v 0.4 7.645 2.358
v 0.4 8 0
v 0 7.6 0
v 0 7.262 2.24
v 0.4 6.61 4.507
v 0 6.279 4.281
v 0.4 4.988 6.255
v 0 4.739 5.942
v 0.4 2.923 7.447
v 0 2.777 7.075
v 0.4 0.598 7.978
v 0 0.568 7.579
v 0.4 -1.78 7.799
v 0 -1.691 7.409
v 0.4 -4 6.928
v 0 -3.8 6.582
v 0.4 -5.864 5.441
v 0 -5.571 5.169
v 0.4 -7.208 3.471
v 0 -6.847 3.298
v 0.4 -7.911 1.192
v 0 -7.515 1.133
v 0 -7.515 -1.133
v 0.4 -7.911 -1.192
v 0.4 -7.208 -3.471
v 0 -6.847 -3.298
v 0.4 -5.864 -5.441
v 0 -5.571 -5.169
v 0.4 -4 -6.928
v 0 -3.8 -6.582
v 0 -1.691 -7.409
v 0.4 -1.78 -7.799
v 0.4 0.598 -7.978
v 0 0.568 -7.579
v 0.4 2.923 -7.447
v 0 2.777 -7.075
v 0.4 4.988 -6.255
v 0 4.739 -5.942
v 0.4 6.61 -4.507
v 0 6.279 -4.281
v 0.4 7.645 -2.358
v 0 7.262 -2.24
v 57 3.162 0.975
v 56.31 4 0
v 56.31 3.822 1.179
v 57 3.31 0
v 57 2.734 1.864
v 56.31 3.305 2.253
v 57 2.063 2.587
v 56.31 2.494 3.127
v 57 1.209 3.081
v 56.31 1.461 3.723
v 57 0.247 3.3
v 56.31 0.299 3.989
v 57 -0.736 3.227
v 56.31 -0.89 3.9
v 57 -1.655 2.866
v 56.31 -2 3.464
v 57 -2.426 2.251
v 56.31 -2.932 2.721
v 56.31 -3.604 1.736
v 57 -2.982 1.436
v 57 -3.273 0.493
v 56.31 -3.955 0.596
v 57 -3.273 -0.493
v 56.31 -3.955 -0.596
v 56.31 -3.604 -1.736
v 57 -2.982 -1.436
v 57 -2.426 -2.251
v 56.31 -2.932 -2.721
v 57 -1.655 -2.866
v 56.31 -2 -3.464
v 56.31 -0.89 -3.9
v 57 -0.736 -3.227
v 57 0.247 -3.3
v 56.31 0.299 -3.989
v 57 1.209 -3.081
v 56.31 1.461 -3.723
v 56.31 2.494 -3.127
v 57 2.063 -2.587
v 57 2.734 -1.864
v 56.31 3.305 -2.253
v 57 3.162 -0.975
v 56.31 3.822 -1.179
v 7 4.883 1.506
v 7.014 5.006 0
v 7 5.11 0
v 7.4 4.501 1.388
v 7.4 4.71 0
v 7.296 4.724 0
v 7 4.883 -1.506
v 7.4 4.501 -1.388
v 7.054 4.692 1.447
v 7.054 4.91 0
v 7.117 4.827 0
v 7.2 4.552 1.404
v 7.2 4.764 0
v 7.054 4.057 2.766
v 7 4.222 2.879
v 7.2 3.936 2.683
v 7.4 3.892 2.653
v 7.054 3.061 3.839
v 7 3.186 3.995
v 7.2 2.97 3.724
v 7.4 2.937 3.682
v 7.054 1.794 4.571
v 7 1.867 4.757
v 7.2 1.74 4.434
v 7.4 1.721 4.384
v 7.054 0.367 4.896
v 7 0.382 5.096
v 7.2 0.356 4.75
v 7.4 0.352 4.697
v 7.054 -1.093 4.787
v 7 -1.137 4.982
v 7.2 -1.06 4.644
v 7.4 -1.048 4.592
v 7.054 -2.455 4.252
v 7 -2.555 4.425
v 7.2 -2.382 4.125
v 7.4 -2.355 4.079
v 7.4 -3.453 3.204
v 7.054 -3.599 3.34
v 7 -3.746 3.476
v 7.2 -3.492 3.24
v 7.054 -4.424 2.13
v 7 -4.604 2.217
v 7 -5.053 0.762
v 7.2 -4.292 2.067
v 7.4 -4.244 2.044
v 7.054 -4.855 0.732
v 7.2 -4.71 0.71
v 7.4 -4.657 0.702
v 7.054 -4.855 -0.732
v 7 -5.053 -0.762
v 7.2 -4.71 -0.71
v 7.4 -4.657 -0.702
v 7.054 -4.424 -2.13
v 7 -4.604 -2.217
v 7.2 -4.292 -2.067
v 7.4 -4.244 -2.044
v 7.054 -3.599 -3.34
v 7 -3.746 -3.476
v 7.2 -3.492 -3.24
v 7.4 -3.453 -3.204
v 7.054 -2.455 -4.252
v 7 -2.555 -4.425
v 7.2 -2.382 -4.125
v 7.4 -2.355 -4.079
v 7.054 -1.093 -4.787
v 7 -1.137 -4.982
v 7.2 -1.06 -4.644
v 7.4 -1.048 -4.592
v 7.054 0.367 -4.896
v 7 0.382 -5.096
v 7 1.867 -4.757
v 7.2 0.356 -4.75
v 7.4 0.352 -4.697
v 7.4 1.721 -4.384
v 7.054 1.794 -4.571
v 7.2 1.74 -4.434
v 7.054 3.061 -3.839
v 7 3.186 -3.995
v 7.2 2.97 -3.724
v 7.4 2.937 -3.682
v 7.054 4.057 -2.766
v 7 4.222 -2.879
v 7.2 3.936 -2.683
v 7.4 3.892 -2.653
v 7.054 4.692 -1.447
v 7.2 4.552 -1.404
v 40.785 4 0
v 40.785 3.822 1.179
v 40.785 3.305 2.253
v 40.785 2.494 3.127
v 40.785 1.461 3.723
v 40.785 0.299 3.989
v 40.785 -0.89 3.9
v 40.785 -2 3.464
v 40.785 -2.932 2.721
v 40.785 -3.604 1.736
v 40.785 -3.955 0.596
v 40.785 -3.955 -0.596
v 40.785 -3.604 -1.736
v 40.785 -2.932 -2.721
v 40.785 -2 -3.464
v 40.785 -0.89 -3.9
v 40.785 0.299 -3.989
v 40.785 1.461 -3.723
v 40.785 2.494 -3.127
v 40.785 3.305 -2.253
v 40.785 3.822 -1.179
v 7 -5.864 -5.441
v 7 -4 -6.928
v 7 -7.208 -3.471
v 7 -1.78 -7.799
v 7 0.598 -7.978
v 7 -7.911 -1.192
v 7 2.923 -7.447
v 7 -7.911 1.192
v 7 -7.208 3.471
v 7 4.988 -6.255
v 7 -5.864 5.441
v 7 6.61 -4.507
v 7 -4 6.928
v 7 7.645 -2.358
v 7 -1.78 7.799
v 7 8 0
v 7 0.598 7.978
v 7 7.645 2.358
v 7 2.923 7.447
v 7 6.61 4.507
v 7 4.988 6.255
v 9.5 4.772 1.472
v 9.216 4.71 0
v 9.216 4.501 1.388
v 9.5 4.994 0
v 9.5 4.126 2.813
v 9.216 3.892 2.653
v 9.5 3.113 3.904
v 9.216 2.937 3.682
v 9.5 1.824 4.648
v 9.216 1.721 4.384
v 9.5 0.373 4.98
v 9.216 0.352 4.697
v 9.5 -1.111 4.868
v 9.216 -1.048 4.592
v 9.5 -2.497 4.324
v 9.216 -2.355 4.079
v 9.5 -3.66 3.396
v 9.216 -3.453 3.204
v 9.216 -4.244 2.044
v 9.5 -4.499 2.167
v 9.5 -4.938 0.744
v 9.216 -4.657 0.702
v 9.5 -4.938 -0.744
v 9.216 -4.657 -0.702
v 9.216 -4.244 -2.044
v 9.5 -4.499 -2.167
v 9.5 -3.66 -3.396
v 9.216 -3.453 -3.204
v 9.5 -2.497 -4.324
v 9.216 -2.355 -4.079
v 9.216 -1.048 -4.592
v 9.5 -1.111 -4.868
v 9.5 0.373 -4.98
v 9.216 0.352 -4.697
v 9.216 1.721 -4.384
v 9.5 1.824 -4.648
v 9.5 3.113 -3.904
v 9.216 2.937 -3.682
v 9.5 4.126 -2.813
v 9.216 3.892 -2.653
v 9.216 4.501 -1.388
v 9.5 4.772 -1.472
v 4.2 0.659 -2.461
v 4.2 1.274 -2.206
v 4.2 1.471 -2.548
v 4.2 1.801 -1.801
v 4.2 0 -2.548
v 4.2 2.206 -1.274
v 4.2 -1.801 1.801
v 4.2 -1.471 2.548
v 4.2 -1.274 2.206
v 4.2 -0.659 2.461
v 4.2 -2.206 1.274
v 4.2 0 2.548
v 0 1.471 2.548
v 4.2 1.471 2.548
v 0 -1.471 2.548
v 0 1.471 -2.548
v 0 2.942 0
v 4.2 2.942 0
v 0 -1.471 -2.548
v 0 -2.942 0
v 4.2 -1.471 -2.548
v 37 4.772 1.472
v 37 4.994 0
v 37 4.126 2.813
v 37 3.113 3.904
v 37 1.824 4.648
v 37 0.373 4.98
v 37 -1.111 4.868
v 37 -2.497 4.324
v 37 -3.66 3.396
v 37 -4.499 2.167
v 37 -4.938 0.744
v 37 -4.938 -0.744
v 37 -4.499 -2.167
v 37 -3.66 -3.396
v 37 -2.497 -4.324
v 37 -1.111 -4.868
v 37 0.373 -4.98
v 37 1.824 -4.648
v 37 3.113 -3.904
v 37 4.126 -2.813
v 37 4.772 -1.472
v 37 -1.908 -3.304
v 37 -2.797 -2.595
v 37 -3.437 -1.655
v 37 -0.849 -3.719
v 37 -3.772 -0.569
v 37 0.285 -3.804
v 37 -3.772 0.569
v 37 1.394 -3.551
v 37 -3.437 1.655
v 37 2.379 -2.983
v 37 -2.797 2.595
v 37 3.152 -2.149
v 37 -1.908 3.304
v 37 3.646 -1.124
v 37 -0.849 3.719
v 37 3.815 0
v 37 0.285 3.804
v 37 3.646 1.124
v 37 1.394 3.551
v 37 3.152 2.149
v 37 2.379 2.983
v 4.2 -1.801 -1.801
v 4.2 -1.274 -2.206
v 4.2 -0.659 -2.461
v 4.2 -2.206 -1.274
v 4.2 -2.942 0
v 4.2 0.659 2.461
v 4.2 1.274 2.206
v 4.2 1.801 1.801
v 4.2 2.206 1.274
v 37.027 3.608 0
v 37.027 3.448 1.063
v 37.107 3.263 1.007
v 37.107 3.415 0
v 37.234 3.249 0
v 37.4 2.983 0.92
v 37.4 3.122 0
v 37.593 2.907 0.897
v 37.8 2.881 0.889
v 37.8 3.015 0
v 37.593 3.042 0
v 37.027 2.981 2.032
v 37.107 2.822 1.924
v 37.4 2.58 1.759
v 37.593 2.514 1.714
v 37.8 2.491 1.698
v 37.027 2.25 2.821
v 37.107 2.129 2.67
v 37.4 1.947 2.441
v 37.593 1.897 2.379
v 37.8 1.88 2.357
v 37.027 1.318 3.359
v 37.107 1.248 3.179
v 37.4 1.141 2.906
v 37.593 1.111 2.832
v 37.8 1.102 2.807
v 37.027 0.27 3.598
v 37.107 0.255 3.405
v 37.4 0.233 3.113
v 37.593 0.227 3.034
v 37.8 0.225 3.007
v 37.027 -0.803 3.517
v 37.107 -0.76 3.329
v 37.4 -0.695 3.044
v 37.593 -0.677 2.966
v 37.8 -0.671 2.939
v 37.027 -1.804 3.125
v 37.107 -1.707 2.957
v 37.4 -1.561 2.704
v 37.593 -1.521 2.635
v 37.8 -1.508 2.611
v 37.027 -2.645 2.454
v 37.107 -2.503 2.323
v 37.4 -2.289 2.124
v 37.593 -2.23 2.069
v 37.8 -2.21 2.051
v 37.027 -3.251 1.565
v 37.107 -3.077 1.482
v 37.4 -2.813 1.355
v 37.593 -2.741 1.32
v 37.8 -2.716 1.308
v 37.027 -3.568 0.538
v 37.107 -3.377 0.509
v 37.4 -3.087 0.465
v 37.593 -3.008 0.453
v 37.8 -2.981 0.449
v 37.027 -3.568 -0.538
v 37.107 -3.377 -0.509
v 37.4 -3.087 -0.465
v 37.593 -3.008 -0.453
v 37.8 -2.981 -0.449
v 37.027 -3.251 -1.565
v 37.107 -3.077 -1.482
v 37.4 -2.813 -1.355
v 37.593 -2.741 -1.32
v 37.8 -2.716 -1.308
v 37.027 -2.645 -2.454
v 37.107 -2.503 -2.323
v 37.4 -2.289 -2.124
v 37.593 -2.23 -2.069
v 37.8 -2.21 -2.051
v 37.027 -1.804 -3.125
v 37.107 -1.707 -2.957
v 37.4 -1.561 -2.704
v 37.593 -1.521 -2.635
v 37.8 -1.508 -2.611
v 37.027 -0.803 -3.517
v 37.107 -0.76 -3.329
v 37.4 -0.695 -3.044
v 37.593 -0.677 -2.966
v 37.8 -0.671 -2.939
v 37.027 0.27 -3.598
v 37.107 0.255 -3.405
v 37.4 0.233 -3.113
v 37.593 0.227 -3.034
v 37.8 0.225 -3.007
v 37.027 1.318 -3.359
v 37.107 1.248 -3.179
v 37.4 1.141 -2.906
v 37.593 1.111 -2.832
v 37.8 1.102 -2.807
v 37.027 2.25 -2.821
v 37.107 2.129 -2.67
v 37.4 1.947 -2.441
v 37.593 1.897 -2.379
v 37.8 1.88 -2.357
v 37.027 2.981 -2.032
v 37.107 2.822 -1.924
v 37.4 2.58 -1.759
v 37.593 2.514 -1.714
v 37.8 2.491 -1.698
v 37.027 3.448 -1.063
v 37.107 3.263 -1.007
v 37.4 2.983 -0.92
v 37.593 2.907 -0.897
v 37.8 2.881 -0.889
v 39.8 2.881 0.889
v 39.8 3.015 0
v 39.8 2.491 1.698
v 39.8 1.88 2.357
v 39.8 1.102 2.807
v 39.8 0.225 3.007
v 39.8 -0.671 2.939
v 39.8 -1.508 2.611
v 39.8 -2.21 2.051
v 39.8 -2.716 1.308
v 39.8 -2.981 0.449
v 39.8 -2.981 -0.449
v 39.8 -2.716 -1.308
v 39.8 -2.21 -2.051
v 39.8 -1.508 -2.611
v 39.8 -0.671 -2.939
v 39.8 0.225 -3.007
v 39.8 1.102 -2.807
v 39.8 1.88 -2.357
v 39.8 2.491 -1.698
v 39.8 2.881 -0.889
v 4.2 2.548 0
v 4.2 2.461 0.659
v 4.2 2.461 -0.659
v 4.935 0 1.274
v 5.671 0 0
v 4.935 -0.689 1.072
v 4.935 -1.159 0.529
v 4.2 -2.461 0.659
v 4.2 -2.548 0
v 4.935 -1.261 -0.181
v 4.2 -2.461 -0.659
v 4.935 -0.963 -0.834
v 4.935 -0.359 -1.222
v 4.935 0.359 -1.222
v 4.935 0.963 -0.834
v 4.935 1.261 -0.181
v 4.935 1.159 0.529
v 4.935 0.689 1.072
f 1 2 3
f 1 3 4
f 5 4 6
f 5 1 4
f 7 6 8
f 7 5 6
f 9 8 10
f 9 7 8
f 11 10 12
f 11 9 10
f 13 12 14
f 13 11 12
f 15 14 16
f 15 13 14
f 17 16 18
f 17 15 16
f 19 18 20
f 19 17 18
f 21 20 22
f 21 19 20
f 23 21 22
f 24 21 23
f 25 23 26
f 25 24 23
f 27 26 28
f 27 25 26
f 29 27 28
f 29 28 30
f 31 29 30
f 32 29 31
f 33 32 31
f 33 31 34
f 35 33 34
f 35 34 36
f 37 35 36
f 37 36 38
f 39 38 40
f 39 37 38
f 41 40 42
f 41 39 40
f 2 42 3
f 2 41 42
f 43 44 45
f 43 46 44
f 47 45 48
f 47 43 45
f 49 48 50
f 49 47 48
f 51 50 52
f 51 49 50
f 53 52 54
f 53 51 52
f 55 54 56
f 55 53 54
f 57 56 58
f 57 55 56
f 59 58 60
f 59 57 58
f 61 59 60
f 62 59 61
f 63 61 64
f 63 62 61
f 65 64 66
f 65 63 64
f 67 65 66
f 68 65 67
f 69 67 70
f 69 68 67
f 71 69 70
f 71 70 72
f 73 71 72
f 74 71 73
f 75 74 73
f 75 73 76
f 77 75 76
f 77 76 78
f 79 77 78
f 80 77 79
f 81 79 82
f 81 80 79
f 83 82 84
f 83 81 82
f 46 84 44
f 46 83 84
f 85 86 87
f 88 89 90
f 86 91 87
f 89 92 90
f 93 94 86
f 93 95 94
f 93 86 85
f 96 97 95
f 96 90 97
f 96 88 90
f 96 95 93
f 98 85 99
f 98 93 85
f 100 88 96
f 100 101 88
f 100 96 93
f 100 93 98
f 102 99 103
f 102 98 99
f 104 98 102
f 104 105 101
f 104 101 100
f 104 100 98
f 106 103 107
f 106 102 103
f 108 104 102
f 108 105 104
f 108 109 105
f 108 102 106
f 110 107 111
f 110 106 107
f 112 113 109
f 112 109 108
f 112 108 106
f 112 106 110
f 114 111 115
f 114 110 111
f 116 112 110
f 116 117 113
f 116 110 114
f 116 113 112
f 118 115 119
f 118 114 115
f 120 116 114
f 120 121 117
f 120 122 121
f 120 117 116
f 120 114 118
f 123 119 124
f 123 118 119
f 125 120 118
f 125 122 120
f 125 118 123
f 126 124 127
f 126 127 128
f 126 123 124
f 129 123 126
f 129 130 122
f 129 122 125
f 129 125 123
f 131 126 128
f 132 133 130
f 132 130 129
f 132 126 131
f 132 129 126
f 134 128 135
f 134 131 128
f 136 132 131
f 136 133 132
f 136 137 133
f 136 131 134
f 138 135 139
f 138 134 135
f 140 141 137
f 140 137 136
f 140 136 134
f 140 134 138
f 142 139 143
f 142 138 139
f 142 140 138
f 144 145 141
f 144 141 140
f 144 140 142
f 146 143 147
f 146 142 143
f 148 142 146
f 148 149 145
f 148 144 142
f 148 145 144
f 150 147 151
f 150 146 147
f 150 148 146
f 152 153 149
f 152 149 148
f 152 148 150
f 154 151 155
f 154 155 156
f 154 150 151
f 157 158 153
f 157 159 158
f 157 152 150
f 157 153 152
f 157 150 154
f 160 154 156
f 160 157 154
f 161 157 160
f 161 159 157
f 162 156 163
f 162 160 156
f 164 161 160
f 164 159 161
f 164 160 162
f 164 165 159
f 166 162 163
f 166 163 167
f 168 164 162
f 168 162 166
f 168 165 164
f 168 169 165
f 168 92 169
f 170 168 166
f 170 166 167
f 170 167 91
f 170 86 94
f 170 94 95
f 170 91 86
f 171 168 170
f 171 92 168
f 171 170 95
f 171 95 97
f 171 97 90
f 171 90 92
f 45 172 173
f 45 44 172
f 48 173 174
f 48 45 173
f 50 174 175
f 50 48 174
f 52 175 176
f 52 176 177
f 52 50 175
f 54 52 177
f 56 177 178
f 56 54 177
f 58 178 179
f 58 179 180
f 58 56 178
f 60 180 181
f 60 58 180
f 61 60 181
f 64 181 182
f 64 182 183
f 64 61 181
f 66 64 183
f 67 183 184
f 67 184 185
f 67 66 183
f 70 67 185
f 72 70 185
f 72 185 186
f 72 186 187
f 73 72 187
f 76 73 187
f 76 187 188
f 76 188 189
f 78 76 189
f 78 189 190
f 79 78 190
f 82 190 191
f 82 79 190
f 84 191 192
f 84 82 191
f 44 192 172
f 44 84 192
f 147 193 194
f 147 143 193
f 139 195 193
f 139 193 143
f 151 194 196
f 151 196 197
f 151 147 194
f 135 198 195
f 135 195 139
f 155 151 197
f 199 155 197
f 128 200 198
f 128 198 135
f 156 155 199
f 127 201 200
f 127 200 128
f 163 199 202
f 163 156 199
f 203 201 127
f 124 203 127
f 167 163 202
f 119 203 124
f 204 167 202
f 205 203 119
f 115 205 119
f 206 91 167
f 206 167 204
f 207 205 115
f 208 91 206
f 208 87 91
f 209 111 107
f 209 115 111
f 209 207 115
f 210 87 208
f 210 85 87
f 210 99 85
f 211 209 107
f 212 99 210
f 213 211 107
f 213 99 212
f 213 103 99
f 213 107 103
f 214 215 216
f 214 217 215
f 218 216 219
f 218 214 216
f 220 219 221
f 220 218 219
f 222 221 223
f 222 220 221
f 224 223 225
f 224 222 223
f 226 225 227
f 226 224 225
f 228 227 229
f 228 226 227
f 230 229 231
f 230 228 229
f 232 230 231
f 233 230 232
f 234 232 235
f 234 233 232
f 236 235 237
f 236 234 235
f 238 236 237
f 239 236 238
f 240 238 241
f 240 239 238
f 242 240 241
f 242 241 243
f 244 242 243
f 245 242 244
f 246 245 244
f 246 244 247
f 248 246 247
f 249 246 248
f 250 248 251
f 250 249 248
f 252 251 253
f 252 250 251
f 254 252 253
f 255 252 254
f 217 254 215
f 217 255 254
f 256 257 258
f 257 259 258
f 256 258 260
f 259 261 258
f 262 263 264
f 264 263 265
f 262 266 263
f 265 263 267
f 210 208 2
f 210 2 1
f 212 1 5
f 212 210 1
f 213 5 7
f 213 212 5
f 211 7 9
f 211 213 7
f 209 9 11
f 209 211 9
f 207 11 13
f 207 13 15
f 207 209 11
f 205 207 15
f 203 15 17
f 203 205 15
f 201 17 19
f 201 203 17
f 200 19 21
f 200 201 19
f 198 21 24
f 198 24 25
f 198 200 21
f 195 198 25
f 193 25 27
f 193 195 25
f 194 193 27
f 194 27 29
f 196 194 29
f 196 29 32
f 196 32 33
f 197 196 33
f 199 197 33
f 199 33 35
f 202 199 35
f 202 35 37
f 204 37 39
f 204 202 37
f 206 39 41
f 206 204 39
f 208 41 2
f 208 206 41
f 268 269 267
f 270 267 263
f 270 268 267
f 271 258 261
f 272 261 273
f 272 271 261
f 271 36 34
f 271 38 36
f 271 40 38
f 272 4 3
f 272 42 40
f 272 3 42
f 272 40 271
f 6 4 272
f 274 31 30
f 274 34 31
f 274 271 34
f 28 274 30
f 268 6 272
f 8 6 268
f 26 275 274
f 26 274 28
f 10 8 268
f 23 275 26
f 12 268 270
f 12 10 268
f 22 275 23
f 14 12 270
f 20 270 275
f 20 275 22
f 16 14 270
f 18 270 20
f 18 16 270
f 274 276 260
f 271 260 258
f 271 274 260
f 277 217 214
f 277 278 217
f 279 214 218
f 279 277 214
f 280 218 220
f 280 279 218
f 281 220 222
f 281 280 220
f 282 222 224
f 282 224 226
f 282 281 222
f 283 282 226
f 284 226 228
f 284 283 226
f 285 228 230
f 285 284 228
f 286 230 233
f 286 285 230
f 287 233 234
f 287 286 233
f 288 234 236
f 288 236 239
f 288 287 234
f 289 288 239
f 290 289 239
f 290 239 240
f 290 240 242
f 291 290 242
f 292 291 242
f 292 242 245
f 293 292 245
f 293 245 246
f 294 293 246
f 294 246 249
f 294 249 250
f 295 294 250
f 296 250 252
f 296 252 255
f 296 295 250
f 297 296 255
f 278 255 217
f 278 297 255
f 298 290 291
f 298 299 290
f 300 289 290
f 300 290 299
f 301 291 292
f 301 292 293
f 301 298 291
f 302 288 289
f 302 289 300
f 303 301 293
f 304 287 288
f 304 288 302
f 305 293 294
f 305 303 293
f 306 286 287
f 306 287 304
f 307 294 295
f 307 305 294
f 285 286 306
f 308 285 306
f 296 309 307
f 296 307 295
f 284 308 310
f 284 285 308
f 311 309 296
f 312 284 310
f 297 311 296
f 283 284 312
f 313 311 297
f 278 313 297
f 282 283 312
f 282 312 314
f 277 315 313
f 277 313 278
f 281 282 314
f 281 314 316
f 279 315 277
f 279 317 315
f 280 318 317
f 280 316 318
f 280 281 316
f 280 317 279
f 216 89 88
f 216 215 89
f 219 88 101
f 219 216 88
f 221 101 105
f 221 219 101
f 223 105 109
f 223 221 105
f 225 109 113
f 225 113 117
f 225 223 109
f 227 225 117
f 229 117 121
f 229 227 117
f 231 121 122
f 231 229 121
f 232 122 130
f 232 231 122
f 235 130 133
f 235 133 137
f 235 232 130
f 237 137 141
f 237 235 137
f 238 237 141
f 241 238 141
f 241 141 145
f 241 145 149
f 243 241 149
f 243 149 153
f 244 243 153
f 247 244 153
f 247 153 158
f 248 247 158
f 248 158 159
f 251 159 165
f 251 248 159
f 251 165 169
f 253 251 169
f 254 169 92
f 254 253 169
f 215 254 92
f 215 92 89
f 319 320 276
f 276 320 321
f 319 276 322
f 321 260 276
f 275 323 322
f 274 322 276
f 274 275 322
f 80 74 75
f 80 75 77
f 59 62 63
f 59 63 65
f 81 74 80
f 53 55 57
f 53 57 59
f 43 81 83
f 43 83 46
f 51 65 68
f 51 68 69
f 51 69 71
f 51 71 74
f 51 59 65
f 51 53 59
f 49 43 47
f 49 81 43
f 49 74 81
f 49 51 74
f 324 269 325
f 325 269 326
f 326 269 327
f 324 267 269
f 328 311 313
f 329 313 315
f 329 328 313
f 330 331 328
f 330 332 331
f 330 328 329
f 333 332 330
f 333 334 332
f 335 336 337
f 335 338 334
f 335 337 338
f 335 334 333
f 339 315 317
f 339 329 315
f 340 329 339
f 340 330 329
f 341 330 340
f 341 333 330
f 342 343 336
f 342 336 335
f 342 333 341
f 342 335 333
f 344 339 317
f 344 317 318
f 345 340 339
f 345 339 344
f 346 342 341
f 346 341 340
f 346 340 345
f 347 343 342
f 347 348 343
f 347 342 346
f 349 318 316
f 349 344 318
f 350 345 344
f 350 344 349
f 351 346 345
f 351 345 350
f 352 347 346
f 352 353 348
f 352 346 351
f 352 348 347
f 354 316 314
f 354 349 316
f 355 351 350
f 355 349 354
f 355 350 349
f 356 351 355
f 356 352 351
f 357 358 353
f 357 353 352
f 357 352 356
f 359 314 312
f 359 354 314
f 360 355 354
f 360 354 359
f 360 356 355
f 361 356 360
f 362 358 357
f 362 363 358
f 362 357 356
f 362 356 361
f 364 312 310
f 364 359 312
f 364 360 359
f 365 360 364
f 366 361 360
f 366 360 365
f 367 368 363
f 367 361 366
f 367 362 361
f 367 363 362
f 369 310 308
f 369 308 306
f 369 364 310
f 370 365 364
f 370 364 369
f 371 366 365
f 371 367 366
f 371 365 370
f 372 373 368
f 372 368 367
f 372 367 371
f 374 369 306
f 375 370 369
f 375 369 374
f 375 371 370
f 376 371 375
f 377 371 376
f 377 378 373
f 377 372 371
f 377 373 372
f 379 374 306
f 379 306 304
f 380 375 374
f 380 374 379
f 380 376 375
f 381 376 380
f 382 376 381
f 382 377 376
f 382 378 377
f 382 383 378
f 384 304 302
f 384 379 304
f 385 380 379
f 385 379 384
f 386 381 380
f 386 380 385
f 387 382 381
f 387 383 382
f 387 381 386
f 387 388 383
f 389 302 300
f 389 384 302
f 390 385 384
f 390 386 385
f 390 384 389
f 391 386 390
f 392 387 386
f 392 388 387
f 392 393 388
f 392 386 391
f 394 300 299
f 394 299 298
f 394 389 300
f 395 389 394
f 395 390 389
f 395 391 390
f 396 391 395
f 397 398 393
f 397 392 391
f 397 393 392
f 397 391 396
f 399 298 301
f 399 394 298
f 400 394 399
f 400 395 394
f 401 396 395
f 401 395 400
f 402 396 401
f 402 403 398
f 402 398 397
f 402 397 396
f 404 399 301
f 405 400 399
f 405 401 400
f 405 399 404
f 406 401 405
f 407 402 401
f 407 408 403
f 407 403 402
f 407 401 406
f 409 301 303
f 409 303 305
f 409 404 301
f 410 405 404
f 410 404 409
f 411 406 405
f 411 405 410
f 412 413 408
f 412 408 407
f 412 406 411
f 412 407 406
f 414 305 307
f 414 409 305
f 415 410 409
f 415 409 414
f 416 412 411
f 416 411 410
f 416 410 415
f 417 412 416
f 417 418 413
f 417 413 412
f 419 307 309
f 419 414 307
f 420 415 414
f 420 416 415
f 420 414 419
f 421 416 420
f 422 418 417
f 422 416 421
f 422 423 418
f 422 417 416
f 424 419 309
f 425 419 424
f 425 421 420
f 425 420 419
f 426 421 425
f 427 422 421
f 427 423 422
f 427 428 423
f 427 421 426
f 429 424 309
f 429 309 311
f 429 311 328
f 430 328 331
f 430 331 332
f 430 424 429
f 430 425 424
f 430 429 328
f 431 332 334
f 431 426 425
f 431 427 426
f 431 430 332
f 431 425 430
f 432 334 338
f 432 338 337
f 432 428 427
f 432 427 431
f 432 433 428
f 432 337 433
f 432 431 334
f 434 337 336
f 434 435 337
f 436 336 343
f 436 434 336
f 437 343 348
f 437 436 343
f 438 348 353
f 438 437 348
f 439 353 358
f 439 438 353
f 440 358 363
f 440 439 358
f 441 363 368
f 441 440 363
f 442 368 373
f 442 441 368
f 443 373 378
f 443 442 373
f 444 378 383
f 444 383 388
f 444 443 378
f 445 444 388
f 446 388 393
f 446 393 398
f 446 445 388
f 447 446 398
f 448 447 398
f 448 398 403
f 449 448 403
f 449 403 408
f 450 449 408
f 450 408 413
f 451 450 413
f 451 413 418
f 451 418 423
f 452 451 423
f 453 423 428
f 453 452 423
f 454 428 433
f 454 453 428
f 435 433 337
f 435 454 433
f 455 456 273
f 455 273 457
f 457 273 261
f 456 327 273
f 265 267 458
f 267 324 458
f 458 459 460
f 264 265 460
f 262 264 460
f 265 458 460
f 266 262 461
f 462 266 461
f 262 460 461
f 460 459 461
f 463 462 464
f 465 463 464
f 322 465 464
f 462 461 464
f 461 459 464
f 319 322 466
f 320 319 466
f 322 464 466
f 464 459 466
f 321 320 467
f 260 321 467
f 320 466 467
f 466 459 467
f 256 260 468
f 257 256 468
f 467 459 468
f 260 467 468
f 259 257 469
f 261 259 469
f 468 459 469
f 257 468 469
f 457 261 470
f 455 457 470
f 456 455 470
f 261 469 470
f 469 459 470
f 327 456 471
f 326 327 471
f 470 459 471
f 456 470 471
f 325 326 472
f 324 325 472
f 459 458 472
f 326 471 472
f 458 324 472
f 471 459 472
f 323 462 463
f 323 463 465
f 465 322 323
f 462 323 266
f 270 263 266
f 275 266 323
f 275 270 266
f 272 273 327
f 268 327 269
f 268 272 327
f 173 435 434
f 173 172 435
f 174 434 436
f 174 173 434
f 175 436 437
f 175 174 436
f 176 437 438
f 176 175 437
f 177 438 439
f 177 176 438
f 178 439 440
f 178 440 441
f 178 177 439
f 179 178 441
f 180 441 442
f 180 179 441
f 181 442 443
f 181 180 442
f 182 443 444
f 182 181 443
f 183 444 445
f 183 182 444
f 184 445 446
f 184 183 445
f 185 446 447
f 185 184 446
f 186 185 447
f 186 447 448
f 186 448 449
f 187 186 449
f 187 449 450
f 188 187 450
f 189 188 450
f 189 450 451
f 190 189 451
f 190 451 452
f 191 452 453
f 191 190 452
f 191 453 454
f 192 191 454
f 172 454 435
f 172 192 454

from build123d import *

# Parameters (mm, degrees)
CHAMFER1_SIZE = 0.4
HEX_2_DEPTH   = 4.2


# Read off the part's stored shape, not the designer's step: ThreadSchematic
with BuildPart() as part:
    # ThreadSchematic outline → ThreadSchematic (revolve)
    with BuildSketch(Plane.YX):
        with BuildLine():
            Line((0, 57), (0, 0))
            Line((0, 0), (8, 0))
            Line((8, 0), (8, 7))
            Line((8, 7), (5.11, 7))
            ThreePointArc((5.11, 7), (4.827157288, 7.117157288), (4.71, 7.4))
            Line((4.71, 7.4), (4.71, 9.2165))
            Line((4.71, 9.2165), (4.9935, 9.5))
            Line((4.9935, 9.5), (4.9935, 37))
            Line((4.9935, 37), (3.815, 37))
            ThreePointArc((3.815, 37), (3.249314575, 37.234314575), (3.015, 37.8))
            Line((3.015, 37.8), (3.015, 39.8))
            Line((3.015, 39.8), (4, 40.785))
            Line((4, 40.785), (4, 56.3095))
            Line((4, 56.3095), (3.3095, 57))
            Line((3.3095, 57), (0, 57))
        make_face()
    revolve(axis=Axis((0, 0, 0), (1, 0, 0)))

    # Chamfer1
    chamfer1_edges = [part.edges().sort_by_distance(p)[0] for p in [
        (0, -8, 0),
    ]]
    chamfer(chamfer1_edges, length=CHAMFER1_SIZE)

    # Sketch2 → PreBroach (revolve, cut)
    with BuildSketch(Plane.XY, mode=Mode.PRIVATE) as prebroach_sk:
        Polygon((0, 2.5475), (4.2, 2.5475), (5.670799811, 0), (0, 0), align=None)
    revolve(prebroach_sk.sketch.rotate(Axis((0, 0, 0), (1, 0, 0)), 90), axis=Axis((0, 0, 0), (1, 0, 0)), mode=Mode.SUBTRACT)

    # Sketch3 → Hex 2 (cut)
    with BuildSketch(Plane.ZY):
        Polygon((-2.5475, -1.470799811), (-2.5475, 1.470799811), (0, 2.941599622), (2.5475, 1.470799811), (2.5475, -1.470799811), (0, -2.941599622), align=None)
    extrude(amount=-HEX_2_DEPTH, mode=Mode.SUBTRACT)


solid = part.part
